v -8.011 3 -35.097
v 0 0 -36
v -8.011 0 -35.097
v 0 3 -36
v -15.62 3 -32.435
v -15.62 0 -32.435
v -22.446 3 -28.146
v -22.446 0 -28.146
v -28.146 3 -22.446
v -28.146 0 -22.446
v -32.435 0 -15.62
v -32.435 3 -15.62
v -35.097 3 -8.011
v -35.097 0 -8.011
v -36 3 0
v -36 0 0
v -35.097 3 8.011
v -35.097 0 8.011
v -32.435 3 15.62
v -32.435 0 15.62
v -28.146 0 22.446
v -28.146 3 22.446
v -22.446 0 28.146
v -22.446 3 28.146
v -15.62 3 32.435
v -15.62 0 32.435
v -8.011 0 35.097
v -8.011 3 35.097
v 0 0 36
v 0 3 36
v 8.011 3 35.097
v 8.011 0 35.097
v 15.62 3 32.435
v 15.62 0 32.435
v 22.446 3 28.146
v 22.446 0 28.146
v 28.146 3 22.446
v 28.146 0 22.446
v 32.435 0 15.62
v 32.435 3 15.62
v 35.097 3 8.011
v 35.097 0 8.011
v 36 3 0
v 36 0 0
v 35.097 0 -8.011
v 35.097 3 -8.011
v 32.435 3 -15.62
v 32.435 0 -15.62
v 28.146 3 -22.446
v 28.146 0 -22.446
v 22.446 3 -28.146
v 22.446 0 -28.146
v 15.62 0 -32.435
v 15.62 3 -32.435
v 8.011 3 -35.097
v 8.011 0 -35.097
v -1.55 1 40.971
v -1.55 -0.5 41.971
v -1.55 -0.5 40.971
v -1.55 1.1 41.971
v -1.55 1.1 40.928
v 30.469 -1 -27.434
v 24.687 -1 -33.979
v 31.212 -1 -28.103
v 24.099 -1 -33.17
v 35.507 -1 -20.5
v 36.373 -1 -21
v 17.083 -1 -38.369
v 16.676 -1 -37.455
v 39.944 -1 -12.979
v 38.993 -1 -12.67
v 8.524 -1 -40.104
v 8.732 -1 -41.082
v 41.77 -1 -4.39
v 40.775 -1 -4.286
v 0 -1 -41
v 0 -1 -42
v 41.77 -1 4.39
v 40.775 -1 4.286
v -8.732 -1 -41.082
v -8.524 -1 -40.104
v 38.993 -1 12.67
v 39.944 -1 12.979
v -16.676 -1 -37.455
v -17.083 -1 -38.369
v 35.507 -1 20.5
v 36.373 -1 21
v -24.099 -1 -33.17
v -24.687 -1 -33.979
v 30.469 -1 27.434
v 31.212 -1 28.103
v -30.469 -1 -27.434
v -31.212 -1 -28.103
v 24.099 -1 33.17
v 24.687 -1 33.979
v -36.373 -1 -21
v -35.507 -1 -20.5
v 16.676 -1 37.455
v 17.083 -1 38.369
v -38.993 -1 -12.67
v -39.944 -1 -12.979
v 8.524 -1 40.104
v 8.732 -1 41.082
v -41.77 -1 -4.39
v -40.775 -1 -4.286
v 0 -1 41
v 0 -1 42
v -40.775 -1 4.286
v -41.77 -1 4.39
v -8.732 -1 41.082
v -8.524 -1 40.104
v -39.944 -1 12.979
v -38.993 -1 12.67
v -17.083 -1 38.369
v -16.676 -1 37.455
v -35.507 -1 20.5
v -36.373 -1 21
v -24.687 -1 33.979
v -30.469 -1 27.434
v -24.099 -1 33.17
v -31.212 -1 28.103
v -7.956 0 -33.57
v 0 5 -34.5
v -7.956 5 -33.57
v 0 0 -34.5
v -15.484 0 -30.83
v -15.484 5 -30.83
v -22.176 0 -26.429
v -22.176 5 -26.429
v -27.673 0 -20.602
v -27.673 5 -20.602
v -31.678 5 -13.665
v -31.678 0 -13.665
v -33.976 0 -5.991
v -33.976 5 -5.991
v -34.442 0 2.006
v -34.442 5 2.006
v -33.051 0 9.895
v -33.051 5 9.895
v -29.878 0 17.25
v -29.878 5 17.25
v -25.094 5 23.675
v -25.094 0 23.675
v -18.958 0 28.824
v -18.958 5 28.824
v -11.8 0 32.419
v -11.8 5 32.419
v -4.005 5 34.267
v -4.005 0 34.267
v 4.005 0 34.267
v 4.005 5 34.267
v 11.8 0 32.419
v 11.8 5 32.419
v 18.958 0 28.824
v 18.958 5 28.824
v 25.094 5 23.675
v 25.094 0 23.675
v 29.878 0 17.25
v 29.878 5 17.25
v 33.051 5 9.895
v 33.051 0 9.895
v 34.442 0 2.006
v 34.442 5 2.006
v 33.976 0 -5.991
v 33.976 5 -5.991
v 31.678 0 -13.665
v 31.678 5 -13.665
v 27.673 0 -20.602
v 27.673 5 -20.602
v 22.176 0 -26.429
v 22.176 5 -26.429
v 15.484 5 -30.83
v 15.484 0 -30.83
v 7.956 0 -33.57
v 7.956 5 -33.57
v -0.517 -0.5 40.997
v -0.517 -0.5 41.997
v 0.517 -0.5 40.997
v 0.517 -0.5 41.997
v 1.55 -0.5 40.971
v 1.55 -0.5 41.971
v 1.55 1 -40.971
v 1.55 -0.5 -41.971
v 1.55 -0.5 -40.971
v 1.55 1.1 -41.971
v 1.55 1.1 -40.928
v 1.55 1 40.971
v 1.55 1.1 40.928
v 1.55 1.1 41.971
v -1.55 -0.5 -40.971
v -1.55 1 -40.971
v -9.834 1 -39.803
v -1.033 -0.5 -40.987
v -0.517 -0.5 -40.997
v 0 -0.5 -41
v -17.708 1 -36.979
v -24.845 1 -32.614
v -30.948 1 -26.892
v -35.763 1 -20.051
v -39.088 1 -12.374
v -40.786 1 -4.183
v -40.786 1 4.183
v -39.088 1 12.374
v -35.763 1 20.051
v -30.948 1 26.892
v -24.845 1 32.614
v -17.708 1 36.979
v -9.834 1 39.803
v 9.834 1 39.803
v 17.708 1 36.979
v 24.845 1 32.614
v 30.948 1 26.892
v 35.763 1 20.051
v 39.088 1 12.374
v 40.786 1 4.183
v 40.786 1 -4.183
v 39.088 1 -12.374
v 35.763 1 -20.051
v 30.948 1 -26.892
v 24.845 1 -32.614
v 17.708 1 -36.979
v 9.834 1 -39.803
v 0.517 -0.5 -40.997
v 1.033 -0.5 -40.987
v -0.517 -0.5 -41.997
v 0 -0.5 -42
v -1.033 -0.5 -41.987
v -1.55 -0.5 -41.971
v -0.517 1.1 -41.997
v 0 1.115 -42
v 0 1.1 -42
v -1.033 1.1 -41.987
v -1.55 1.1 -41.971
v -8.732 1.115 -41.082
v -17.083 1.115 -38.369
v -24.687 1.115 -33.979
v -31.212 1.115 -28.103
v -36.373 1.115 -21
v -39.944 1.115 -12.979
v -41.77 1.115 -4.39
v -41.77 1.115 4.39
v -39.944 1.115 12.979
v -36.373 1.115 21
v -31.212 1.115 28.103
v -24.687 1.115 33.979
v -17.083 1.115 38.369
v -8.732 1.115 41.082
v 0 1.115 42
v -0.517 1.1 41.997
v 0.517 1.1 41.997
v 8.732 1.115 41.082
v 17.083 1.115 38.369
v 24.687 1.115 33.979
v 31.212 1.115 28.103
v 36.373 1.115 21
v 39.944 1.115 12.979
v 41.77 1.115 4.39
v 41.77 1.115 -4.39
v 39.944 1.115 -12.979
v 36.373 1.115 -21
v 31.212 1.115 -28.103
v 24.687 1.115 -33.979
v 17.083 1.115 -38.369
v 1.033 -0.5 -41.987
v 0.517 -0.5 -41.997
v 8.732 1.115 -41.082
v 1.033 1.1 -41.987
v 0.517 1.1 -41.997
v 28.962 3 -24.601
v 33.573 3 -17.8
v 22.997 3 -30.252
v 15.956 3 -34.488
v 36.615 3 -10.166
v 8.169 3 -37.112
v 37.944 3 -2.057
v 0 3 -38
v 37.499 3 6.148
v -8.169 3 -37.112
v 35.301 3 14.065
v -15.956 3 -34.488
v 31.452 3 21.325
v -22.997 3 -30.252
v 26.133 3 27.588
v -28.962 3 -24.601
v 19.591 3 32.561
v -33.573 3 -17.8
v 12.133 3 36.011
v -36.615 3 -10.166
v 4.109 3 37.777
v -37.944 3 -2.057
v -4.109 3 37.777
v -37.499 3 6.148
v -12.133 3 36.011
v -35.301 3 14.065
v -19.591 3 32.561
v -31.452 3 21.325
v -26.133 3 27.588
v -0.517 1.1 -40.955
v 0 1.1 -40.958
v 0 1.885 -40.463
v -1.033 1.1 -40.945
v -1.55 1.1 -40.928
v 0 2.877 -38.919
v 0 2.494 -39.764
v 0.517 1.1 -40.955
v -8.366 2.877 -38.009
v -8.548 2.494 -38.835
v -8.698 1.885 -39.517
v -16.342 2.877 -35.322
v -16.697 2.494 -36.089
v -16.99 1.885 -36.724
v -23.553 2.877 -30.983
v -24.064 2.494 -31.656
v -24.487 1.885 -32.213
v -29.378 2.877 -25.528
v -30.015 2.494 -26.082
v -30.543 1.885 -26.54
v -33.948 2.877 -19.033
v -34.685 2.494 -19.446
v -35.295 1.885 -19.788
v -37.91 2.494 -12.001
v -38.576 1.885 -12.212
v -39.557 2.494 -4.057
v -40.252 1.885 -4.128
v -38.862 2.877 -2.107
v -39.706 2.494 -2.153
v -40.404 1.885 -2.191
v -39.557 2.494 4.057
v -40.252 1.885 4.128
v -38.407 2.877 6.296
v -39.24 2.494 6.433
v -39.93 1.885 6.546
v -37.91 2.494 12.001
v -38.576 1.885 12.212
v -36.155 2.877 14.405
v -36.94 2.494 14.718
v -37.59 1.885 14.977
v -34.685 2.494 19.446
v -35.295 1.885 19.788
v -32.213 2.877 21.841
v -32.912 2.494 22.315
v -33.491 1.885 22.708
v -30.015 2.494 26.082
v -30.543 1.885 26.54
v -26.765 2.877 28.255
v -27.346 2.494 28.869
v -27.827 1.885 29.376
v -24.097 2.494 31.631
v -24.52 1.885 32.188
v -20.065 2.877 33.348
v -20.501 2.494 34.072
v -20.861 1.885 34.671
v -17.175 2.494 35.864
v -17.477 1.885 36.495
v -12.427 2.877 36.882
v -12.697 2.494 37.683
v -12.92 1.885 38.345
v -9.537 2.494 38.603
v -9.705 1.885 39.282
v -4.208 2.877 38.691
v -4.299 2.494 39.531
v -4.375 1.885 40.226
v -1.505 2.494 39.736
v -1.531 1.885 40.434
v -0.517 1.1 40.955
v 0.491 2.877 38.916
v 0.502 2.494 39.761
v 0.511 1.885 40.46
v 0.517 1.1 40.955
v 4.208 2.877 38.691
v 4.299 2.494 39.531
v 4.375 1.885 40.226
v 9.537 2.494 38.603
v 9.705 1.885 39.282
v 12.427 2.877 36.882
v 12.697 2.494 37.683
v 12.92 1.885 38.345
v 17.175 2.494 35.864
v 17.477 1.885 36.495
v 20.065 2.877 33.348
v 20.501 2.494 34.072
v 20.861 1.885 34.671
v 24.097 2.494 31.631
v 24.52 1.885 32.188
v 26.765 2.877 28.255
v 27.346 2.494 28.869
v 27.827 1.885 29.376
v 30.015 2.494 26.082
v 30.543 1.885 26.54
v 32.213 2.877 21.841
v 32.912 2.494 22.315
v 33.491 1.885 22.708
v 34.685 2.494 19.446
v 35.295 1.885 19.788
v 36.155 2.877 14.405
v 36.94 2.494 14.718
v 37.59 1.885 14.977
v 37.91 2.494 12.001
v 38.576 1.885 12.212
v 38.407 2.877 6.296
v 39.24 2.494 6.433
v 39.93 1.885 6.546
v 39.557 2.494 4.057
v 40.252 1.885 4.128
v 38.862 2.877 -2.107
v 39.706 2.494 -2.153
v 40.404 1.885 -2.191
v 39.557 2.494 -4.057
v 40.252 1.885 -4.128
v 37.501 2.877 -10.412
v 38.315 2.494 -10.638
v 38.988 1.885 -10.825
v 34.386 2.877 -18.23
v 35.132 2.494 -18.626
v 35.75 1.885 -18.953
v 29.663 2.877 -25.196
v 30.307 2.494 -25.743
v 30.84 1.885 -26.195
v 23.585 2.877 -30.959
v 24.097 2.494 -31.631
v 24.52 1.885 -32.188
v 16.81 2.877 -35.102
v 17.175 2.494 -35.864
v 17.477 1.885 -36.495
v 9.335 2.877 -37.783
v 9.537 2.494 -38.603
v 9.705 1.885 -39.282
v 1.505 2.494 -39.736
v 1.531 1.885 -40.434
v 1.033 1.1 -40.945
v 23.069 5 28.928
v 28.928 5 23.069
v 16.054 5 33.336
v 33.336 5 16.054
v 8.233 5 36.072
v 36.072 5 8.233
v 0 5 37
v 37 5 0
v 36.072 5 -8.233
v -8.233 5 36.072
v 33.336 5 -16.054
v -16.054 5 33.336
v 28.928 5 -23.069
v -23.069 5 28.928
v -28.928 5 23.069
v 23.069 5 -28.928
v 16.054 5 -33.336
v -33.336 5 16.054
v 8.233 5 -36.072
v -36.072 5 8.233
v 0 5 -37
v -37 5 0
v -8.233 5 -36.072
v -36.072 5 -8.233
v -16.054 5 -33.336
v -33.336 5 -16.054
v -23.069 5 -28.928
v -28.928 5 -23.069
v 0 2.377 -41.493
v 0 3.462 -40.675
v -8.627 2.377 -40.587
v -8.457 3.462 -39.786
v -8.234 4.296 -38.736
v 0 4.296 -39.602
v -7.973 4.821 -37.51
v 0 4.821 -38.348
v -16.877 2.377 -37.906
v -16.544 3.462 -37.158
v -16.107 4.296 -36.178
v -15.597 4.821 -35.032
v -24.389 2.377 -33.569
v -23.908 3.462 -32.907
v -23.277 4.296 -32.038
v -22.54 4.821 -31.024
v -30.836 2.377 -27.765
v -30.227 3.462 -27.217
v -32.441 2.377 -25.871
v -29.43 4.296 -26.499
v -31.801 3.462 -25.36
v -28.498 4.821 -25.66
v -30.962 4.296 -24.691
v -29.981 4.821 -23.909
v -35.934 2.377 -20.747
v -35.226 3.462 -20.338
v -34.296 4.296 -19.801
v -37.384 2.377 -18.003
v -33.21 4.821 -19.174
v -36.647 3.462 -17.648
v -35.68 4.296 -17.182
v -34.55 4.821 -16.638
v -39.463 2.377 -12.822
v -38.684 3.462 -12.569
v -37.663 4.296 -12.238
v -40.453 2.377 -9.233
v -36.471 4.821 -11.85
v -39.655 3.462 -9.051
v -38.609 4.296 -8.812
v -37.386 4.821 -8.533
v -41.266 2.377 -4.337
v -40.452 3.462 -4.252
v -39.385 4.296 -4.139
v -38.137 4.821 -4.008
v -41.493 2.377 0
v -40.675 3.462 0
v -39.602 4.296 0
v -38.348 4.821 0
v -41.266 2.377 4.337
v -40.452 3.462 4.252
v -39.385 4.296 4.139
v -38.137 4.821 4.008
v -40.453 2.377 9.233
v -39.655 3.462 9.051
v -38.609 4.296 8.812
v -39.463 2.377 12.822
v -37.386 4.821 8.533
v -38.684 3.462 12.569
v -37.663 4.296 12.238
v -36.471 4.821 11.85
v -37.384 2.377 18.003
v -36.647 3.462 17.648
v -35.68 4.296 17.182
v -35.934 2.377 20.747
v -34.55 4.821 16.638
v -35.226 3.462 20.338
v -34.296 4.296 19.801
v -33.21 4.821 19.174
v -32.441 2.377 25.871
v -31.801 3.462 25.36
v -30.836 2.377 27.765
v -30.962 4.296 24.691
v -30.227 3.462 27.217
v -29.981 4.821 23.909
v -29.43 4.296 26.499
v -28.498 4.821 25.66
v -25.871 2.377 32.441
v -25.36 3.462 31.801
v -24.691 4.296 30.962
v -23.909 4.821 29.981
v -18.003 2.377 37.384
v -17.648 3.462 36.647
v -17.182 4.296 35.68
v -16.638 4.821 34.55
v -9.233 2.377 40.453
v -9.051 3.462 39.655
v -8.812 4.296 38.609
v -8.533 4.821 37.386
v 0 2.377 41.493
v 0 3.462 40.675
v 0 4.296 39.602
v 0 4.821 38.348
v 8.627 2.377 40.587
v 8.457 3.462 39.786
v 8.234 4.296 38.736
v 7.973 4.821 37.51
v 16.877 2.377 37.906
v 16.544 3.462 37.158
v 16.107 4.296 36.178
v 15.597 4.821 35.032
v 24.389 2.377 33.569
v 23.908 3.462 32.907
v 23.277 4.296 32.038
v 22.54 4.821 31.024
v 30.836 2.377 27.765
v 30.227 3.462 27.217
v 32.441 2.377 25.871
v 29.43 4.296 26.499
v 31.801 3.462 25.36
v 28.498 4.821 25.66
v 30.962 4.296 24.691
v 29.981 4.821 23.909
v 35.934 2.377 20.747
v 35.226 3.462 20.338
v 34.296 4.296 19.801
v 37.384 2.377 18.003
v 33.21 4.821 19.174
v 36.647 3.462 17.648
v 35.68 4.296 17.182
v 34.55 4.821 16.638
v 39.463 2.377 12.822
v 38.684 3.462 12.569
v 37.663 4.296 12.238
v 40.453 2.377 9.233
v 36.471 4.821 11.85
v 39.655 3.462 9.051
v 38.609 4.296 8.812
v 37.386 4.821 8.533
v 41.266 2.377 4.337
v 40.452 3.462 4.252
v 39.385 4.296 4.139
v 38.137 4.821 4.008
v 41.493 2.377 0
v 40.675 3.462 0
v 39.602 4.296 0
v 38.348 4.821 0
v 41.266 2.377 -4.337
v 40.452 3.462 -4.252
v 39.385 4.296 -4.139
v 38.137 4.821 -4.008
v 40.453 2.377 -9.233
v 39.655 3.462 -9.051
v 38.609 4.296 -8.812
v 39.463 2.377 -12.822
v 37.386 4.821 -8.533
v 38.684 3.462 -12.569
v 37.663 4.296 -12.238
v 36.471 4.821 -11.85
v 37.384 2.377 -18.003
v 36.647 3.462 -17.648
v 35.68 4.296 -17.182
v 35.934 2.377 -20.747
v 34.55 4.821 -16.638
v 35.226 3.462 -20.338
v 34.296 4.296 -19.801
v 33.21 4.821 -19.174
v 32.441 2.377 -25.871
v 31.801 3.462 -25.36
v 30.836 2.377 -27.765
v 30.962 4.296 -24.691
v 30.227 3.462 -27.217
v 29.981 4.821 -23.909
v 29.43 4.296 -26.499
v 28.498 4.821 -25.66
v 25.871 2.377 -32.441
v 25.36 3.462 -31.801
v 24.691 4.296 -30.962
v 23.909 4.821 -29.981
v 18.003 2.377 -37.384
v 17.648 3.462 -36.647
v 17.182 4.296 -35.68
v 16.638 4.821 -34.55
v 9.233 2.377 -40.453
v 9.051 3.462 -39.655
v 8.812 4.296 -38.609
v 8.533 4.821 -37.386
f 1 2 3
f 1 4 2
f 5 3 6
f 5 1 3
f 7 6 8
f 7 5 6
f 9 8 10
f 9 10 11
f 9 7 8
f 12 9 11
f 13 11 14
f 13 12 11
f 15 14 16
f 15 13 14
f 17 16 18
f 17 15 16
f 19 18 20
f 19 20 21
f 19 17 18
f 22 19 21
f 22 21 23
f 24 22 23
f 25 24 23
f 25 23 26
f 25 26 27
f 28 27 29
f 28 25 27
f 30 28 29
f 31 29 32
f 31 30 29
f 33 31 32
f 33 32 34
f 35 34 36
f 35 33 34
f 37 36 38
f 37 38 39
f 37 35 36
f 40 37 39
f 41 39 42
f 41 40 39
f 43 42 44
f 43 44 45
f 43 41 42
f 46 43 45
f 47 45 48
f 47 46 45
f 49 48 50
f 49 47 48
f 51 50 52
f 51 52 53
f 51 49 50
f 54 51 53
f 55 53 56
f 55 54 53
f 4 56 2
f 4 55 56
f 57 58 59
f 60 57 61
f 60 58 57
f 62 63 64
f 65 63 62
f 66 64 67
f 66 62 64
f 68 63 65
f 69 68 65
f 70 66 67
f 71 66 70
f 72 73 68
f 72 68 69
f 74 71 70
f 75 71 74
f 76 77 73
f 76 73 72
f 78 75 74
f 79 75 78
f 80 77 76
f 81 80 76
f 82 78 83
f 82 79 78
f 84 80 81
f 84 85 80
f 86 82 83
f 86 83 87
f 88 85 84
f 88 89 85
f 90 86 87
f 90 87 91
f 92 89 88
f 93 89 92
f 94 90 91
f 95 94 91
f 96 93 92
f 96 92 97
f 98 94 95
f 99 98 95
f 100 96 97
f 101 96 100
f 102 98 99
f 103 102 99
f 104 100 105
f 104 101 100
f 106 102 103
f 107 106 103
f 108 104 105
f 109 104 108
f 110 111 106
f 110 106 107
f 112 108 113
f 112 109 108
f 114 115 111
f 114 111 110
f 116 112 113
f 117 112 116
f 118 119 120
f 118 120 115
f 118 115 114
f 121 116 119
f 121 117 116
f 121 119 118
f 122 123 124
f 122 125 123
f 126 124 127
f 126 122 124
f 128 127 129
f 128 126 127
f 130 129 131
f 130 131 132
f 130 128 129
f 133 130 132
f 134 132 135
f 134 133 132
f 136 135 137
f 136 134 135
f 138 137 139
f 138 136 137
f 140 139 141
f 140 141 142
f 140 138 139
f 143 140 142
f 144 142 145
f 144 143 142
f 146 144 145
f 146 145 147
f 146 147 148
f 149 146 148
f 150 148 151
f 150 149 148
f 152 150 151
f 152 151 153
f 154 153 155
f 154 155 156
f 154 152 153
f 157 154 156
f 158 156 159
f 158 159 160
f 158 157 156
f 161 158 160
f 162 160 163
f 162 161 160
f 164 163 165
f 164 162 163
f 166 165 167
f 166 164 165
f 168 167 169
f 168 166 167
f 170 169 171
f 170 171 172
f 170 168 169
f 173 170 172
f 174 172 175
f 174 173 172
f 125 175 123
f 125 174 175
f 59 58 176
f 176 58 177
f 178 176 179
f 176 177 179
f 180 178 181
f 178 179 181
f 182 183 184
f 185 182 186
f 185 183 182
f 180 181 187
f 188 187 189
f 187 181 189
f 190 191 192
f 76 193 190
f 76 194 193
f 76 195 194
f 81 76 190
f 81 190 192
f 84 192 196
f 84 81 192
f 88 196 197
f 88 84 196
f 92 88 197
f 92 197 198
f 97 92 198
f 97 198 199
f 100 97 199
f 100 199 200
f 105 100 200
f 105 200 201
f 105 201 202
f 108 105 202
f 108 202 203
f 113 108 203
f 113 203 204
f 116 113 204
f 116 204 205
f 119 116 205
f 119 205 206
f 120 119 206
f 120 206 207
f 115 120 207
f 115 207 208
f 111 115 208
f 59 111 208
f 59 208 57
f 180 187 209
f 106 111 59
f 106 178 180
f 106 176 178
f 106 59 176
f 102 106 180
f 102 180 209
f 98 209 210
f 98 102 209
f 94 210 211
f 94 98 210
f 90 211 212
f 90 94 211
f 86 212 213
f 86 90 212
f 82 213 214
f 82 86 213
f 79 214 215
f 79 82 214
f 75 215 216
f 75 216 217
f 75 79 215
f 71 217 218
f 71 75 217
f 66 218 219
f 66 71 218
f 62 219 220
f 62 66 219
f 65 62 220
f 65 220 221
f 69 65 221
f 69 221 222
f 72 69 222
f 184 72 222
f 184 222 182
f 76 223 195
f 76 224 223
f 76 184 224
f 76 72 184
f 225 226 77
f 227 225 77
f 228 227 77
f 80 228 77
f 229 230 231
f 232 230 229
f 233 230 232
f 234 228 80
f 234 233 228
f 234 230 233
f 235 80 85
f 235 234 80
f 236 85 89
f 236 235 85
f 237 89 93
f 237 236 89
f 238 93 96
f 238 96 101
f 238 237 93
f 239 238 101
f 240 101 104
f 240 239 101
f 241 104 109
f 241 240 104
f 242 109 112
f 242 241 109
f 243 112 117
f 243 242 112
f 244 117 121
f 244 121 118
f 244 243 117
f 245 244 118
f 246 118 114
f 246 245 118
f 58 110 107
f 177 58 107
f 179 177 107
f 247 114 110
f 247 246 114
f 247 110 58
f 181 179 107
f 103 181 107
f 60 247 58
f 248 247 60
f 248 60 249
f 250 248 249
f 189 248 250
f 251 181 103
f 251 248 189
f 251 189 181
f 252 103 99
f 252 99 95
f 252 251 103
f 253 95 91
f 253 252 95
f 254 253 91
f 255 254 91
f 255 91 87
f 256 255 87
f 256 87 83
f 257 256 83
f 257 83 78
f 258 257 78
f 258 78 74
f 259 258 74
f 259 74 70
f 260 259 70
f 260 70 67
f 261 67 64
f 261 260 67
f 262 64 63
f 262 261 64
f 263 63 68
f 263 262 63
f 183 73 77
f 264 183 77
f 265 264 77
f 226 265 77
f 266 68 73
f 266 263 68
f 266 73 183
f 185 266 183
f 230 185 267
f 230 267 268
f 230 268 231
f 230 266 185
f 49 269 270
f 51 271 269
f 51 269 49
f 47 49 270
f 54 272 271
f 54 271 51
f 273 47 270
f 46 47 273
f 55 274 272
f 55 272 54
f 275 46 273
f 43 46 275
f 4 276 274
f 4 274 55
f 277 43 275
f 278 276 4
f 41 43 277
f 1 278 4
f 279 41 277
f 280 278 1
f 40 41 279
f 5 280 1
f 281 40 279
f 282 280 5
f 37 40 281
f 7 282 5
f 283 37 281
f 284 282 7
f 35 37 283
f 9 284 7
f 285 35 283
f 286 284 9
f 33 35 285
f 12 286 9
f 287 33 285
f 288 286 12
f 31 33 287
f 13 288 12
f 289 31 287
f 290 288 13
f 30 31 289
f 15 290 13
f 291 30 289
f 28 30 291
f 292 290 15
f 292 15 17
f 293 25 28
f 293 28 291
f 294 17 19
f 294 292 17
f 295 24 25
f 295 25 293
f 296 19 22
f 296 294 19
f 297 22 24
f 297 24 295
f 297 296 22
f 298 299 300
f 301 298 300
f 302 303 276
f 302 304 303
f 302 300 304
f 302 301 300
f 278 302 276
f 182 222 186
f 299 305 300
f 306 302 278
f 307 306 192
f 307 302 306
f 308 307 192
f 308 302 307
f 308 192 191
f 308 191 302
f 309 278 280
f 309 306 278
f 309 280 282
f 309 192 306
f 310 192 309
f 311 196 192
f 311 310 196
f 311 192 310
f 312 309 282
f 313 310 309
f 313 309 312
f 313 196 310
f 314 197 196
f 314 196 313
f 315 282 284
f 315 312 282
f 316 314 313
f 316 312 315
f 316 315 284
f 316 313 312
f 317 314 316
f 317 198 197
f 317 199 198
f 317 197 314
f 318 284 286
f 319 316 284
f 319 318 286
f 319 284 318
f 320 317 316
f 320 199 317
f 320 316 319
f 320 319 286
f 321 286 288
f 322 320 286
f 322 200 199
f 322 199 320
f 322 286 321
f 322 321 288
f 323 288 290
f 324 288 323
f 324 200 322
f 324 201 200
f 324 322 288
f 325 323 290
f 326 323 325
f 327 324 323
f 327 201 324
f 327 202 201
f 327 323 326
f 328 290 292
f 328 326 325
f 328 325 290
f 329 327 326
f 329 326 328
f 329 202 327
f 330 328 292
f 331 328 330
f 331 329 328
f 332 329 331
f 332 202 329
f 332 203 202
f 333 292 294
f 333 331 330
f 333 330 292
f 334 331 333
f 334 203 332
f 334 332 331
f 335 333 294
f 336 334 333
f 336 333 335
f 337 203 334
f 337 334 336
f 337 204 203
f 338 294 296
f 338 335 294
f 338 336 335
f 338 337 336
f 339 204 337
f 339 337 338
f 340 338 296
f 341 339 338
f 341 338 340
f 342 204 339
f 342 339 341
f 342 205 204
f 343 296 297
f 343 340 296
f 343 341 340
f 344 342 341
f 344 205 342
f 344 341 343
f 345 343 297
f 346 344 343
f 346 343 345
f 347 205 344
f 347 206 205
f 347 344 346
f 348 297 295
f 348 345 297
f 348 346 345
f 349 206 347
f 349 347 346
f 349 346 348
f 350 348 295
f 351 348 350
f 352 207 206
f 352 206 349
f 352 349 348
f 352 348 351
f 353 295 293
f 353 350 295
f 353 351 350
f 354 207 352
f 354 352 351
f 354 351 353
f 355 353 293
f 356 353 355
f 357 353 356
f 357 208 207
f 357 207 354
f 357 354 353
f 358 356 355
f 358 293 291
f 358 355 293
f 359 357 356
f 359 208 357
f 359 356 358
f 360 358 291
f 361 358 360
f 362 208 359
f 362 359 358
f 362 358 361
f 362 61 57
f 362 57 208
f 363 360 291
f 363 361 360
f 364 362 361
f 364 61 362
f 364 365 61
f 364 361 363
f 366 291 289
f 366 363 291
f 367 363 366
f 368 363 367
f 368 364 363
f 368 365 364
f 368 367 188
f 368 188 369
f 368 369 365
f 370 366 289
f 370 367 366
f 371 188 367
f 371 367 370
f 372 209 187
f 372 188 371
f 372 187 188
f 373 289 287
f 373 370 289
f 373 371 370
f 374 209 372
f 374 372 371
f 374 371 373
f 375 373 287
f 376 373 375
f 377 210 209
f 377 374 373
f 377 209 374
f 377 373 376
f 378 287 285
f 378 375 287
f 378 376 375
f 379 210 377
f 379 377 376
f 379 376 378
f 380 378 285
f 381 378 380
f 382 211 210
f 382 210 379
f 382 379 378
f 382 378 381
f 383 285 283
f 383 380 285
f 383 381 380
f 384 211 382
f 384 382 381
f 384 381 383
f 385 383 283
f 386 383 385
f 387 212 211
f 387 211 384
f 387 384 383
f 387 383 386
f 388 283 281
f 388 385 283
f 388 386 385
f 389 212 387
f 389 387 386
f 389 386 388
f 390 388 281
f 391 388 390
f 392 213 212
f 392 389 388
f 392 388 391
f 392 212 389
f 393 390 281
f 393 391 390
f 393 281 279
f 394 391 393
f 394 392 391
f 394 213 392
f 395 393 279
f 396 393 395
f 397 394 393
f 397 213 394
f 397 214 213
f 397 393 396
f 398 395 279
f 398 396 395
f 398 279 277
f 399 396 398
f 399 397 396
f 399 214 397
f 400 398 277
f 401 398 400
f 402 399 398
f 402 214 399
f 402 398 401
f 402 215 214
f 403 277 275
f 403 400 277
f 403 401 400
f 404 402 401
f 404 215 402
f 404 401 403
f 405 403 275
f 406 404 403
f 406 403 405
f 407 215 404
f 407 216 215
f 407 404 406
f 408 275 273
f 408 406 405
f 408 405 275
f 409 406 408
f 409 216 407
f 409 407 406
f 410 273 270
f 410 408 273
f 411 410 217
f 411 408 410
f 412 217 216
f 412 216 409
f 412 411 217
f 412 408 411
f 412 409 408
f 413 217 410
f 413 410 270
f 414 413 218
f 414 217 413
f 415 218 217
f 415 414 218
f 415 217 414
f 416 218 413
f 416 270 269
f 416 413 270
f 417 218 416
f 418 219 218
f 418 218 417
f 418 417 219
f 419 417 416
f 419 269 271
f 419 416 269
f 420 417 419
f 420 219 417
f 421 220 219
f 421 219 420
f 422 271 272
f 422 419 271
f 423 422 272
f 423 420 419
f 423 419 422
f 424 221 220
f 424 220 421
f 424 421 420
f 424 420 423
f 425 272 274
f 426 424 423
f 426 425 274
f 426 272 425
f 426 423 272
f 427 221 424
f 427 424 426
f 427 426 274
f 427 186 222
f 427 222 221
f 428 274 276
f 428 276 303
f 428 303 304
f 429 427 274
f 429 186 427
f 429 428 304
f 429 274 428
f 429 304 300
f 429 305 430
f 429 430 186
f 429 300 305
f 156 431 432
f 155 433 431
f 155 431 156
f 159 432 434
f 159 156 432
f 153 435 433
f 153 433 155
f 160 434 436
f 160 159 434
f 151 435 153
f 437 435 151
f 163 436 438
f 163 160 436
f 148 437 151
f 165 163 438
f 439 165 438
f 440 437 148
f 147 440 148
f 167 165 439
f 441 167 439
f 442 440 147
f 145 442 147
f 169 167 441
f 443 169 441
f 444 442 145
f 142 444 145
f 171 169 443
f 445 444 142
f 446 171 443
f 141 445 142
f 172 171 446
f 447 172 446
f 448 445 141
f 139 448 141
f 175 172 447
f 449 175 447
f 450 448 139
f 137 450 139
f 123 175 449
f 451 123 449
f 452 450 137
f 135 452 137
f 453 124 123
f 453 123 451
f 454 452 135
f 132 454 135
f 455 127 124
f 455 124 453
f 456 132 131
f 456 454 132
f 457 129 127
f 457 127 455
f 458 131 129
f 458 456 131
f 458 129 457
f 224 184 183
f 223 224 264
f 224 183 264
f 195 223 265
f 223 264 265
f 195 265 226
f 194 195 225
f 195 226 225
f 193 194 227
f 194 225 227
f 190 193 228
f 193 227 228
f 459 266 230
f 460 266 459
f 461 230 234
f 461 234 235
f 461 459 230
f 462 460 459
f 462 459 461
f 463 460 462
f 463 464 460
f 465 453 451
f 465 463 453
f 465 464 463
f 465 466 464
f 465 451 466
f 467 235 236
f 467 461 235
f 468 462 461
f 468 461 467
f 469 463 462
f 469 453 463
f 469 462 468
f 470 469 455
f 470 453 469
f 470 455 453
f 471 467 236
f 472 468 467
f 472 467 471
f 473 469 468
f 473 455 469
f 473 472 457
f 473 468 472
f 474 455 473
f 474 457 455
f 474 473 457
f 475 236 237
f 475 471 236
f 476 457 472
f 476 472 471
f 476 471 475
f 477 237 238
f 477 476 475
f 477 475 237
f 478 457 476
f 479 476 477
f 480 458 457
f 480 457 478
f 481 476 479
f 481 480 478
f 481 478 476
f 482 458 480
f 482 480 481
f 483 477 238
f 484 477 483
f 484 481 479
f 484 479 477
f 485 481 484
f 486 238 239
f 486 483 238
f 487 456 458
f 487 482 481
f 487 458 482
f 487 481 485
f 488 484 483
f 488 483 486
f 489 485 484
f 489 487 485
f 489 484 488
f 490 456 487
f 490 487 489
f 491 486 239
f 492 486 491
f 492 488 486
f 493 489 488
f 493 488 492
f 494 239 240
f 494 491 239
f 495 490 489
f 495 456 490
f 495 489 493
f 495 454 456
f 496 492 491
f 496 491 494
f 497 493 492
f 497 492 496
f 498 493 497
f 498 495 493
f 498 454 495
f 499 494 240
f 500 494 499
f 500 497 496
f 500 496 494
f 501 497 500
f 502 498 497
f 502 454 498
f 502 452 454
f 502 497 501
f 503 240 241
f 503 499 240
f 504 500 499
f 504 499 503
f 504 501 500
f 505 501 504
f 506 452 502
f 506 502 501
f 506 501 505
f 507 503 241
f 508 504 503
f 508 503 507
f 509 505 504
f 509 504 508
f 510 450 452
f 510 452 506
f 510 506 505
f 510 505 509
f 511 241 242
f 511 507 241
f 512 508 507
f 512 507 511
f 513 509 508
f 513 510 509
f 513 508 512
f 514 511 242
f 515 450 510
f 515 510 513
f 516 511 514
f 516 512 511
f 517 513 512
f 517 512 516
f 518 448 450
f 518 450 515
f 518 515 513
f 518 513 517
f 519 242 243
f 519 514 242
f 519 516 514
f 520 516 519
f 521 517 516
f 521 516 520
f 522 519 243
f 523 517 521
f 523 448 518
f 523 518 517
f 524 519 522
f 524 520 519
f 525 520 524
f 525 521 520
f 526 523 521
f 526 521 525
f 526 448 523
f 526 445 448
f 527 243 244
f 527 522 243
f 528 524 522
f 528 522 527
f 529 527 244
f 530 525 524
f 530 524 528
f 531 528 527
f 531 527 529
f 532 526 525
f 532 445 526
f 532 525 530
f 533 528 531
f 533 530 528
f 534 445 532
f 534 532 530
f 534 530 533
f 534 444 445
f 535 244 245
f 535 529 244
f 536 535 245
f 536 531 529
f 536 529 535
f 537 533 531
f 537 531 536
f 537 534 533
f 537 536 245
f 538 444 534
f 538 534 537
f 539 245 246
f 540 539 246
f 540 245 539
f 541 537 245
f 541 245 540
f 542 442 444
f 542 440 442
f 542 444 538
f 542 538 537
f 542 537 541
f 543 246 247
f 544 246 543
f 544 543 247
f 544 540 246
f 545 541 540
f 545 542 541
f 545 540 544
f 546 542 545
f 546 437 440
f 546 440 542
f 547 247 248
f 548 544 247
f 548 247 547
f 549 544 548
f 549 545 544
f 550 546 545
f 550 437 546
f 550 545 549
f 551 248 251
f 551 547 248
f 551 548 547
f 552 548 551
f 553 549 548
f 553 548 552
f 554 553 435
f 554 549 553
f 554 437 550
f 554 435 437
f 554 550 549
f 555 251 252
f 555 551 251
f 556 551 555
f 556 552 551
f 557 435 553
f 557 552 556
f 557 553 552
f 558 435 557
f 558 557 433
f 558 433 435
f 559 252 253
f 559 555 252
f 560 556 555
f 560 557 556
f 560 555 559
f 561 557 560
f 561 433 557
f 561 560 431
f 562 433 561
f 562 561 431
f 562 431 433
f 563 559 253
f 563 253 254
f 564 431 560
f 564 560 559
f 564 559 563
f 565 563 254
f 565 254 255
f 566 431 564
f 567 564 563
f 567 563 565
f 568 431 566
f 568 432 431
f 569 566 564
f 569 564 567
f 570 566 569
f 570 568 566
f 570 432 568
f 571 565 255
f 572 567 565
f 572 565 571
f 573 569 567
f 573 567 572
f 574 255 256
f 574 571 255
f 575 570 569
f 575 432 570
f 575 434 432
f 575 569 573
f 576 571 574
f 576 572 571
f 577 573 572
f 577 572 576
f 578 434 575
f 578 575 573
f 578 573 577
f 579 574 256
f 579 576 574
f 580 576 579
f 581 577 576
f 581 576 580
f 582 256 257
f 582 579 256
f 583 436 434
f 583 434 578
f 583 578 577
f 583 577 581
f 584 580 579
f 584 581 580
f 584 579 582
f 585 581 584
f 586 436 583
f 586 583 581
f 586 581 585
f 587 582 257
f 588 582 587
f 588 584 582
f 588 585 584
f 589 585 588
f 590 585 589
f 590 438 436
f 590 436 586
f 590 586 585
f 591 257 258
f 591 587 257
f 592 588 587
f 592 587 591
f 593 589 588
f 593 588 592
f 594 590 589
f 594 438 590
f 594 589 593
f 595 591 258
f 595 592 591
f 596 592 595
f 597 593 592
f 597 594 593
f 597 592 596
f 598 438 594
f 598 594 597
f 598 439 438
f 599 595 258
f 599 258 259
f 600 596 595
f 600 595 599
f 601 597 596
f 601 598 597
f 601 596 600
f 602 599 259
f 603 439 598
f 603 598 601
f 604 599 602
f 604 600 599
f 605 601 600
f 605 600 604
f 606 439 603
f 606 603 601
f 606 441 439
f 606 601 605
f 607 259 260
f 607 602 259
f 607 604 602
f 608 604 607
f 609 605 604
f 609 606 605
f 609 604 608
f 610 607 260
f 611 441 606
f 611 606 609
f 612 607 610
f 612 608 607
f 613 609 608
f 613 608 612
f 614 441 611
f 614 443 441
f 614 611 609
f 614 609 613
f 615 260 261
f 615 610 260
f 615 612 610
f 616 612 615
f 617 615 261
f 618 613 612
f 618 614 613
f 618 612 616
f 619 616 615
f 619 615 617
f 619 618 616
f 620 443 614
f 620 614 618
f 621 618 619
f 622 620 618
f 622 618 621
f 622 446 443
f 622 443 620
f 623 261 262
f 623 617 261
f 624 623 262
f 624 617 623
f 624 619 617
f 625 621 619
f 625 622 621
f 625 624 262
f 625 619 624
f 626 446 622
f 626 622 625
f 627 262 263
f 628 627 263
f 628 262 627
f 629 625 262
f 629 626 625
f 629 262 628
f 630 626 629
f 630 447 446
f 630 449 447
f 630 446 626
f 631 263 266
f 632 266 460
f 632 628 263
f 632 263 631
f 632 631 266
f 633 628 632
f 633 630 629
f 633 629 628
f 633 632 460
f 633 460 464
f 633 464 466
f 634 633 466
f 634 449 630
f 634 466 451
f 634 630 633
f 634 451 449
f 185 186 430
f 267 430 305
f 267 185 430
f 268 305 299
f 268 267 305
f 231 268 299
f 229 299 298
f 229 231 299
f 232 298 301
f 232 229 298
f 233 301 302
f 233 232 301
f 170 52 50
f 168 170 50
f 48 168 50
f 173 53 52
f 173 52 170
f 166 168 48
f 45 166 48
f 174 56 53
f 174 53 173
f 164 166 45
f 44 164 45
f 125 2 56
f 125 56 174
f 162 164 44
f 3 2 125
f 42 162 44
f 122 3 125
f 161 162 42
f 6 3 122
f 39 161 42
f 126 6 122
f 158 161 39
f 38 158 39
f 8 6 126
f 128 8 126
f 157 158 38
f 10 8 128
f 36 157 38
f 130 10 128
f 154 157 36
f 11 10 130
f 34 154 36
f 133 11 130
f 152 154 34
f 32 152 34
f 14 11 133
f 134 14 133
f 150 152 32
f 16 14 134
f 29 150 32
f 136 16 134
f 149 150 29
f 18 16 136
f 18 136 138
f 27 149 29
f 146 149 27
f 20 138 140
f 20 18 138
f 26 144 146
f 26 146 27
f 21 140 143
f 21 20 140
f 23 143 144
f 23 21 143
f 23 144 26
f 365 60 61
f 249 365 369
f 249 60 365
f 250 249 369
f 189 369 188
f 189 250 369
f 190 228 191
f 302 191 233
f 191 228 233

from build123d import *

# Parameters (mm, degrees)
SKETCH_2_W               = 3.1
SKETCH_2_H               = 1.6
CUT_EXTRUDE_1_DEPTH      = 5
PATTERN_CIRCULAR_2_COUNT = 2


with BuildPart() as part:
    # Эскиз1 → Повернуть1 (revolve)
    with BuildSketch(Plane(origin=(0, 0, 0), x_dir=(0, 0, -1), z_dir=(1, 0, 0))):
        with BuildLine():
            Line((36, 0), (36, 3))
            Line((36, 3), (38, 3))
            ThreePointArc((38, 3), (39.809588321, 2.464382482), (41, 1))
            Line((41, 1), (41, -1))
            Line((41, -1), (42, -1))
            Line((42, -1), (42, 1.115227568))
            ThreePointArc((42, 1.115227568), (40.165890745, 3.914666233), (37, 5))
            Line((37, 5), (34.5, 5))
            Line((34.5, 5), (34.5, 0))
            Line((34.5, 0), (36, 0))
        make_face()
    revolve(axis=Axis((0, 0, 0), (0, 1, 0)))

    # Эскиз2 → Вырез-Вытянуть1 (cut)
    with BuildSketch(Plane(origin=(0, 0, -42), x_dir=(-1, 0, 0), z_dir=(0, 0, -1))):
        with Locations((0, 0.3)):
            Rectangle(SKETCH_2_W, SKETCH_2_H)
    cut_extrude_1 = extrude(amount=-CUT_EXTRUDE_1_DEPTH, mode=Mode.SUBTRACT)

    # Круговой массив2: Вырез-Вытянуть1 ×2 about axis
    pattern_circular_2_axis = Axis((0, 0, 0), (0, -1, 0))
    for i in range(1, PATTERN_CIRCULAR_2_COUNT):
        add(cut_extrude_1.rotate(pattern_circular_2_axis, i * 360 / PATTERN_CIRCULAR_2_COUNT), mode=Mode.SUBTRACT)


solid = part.part
